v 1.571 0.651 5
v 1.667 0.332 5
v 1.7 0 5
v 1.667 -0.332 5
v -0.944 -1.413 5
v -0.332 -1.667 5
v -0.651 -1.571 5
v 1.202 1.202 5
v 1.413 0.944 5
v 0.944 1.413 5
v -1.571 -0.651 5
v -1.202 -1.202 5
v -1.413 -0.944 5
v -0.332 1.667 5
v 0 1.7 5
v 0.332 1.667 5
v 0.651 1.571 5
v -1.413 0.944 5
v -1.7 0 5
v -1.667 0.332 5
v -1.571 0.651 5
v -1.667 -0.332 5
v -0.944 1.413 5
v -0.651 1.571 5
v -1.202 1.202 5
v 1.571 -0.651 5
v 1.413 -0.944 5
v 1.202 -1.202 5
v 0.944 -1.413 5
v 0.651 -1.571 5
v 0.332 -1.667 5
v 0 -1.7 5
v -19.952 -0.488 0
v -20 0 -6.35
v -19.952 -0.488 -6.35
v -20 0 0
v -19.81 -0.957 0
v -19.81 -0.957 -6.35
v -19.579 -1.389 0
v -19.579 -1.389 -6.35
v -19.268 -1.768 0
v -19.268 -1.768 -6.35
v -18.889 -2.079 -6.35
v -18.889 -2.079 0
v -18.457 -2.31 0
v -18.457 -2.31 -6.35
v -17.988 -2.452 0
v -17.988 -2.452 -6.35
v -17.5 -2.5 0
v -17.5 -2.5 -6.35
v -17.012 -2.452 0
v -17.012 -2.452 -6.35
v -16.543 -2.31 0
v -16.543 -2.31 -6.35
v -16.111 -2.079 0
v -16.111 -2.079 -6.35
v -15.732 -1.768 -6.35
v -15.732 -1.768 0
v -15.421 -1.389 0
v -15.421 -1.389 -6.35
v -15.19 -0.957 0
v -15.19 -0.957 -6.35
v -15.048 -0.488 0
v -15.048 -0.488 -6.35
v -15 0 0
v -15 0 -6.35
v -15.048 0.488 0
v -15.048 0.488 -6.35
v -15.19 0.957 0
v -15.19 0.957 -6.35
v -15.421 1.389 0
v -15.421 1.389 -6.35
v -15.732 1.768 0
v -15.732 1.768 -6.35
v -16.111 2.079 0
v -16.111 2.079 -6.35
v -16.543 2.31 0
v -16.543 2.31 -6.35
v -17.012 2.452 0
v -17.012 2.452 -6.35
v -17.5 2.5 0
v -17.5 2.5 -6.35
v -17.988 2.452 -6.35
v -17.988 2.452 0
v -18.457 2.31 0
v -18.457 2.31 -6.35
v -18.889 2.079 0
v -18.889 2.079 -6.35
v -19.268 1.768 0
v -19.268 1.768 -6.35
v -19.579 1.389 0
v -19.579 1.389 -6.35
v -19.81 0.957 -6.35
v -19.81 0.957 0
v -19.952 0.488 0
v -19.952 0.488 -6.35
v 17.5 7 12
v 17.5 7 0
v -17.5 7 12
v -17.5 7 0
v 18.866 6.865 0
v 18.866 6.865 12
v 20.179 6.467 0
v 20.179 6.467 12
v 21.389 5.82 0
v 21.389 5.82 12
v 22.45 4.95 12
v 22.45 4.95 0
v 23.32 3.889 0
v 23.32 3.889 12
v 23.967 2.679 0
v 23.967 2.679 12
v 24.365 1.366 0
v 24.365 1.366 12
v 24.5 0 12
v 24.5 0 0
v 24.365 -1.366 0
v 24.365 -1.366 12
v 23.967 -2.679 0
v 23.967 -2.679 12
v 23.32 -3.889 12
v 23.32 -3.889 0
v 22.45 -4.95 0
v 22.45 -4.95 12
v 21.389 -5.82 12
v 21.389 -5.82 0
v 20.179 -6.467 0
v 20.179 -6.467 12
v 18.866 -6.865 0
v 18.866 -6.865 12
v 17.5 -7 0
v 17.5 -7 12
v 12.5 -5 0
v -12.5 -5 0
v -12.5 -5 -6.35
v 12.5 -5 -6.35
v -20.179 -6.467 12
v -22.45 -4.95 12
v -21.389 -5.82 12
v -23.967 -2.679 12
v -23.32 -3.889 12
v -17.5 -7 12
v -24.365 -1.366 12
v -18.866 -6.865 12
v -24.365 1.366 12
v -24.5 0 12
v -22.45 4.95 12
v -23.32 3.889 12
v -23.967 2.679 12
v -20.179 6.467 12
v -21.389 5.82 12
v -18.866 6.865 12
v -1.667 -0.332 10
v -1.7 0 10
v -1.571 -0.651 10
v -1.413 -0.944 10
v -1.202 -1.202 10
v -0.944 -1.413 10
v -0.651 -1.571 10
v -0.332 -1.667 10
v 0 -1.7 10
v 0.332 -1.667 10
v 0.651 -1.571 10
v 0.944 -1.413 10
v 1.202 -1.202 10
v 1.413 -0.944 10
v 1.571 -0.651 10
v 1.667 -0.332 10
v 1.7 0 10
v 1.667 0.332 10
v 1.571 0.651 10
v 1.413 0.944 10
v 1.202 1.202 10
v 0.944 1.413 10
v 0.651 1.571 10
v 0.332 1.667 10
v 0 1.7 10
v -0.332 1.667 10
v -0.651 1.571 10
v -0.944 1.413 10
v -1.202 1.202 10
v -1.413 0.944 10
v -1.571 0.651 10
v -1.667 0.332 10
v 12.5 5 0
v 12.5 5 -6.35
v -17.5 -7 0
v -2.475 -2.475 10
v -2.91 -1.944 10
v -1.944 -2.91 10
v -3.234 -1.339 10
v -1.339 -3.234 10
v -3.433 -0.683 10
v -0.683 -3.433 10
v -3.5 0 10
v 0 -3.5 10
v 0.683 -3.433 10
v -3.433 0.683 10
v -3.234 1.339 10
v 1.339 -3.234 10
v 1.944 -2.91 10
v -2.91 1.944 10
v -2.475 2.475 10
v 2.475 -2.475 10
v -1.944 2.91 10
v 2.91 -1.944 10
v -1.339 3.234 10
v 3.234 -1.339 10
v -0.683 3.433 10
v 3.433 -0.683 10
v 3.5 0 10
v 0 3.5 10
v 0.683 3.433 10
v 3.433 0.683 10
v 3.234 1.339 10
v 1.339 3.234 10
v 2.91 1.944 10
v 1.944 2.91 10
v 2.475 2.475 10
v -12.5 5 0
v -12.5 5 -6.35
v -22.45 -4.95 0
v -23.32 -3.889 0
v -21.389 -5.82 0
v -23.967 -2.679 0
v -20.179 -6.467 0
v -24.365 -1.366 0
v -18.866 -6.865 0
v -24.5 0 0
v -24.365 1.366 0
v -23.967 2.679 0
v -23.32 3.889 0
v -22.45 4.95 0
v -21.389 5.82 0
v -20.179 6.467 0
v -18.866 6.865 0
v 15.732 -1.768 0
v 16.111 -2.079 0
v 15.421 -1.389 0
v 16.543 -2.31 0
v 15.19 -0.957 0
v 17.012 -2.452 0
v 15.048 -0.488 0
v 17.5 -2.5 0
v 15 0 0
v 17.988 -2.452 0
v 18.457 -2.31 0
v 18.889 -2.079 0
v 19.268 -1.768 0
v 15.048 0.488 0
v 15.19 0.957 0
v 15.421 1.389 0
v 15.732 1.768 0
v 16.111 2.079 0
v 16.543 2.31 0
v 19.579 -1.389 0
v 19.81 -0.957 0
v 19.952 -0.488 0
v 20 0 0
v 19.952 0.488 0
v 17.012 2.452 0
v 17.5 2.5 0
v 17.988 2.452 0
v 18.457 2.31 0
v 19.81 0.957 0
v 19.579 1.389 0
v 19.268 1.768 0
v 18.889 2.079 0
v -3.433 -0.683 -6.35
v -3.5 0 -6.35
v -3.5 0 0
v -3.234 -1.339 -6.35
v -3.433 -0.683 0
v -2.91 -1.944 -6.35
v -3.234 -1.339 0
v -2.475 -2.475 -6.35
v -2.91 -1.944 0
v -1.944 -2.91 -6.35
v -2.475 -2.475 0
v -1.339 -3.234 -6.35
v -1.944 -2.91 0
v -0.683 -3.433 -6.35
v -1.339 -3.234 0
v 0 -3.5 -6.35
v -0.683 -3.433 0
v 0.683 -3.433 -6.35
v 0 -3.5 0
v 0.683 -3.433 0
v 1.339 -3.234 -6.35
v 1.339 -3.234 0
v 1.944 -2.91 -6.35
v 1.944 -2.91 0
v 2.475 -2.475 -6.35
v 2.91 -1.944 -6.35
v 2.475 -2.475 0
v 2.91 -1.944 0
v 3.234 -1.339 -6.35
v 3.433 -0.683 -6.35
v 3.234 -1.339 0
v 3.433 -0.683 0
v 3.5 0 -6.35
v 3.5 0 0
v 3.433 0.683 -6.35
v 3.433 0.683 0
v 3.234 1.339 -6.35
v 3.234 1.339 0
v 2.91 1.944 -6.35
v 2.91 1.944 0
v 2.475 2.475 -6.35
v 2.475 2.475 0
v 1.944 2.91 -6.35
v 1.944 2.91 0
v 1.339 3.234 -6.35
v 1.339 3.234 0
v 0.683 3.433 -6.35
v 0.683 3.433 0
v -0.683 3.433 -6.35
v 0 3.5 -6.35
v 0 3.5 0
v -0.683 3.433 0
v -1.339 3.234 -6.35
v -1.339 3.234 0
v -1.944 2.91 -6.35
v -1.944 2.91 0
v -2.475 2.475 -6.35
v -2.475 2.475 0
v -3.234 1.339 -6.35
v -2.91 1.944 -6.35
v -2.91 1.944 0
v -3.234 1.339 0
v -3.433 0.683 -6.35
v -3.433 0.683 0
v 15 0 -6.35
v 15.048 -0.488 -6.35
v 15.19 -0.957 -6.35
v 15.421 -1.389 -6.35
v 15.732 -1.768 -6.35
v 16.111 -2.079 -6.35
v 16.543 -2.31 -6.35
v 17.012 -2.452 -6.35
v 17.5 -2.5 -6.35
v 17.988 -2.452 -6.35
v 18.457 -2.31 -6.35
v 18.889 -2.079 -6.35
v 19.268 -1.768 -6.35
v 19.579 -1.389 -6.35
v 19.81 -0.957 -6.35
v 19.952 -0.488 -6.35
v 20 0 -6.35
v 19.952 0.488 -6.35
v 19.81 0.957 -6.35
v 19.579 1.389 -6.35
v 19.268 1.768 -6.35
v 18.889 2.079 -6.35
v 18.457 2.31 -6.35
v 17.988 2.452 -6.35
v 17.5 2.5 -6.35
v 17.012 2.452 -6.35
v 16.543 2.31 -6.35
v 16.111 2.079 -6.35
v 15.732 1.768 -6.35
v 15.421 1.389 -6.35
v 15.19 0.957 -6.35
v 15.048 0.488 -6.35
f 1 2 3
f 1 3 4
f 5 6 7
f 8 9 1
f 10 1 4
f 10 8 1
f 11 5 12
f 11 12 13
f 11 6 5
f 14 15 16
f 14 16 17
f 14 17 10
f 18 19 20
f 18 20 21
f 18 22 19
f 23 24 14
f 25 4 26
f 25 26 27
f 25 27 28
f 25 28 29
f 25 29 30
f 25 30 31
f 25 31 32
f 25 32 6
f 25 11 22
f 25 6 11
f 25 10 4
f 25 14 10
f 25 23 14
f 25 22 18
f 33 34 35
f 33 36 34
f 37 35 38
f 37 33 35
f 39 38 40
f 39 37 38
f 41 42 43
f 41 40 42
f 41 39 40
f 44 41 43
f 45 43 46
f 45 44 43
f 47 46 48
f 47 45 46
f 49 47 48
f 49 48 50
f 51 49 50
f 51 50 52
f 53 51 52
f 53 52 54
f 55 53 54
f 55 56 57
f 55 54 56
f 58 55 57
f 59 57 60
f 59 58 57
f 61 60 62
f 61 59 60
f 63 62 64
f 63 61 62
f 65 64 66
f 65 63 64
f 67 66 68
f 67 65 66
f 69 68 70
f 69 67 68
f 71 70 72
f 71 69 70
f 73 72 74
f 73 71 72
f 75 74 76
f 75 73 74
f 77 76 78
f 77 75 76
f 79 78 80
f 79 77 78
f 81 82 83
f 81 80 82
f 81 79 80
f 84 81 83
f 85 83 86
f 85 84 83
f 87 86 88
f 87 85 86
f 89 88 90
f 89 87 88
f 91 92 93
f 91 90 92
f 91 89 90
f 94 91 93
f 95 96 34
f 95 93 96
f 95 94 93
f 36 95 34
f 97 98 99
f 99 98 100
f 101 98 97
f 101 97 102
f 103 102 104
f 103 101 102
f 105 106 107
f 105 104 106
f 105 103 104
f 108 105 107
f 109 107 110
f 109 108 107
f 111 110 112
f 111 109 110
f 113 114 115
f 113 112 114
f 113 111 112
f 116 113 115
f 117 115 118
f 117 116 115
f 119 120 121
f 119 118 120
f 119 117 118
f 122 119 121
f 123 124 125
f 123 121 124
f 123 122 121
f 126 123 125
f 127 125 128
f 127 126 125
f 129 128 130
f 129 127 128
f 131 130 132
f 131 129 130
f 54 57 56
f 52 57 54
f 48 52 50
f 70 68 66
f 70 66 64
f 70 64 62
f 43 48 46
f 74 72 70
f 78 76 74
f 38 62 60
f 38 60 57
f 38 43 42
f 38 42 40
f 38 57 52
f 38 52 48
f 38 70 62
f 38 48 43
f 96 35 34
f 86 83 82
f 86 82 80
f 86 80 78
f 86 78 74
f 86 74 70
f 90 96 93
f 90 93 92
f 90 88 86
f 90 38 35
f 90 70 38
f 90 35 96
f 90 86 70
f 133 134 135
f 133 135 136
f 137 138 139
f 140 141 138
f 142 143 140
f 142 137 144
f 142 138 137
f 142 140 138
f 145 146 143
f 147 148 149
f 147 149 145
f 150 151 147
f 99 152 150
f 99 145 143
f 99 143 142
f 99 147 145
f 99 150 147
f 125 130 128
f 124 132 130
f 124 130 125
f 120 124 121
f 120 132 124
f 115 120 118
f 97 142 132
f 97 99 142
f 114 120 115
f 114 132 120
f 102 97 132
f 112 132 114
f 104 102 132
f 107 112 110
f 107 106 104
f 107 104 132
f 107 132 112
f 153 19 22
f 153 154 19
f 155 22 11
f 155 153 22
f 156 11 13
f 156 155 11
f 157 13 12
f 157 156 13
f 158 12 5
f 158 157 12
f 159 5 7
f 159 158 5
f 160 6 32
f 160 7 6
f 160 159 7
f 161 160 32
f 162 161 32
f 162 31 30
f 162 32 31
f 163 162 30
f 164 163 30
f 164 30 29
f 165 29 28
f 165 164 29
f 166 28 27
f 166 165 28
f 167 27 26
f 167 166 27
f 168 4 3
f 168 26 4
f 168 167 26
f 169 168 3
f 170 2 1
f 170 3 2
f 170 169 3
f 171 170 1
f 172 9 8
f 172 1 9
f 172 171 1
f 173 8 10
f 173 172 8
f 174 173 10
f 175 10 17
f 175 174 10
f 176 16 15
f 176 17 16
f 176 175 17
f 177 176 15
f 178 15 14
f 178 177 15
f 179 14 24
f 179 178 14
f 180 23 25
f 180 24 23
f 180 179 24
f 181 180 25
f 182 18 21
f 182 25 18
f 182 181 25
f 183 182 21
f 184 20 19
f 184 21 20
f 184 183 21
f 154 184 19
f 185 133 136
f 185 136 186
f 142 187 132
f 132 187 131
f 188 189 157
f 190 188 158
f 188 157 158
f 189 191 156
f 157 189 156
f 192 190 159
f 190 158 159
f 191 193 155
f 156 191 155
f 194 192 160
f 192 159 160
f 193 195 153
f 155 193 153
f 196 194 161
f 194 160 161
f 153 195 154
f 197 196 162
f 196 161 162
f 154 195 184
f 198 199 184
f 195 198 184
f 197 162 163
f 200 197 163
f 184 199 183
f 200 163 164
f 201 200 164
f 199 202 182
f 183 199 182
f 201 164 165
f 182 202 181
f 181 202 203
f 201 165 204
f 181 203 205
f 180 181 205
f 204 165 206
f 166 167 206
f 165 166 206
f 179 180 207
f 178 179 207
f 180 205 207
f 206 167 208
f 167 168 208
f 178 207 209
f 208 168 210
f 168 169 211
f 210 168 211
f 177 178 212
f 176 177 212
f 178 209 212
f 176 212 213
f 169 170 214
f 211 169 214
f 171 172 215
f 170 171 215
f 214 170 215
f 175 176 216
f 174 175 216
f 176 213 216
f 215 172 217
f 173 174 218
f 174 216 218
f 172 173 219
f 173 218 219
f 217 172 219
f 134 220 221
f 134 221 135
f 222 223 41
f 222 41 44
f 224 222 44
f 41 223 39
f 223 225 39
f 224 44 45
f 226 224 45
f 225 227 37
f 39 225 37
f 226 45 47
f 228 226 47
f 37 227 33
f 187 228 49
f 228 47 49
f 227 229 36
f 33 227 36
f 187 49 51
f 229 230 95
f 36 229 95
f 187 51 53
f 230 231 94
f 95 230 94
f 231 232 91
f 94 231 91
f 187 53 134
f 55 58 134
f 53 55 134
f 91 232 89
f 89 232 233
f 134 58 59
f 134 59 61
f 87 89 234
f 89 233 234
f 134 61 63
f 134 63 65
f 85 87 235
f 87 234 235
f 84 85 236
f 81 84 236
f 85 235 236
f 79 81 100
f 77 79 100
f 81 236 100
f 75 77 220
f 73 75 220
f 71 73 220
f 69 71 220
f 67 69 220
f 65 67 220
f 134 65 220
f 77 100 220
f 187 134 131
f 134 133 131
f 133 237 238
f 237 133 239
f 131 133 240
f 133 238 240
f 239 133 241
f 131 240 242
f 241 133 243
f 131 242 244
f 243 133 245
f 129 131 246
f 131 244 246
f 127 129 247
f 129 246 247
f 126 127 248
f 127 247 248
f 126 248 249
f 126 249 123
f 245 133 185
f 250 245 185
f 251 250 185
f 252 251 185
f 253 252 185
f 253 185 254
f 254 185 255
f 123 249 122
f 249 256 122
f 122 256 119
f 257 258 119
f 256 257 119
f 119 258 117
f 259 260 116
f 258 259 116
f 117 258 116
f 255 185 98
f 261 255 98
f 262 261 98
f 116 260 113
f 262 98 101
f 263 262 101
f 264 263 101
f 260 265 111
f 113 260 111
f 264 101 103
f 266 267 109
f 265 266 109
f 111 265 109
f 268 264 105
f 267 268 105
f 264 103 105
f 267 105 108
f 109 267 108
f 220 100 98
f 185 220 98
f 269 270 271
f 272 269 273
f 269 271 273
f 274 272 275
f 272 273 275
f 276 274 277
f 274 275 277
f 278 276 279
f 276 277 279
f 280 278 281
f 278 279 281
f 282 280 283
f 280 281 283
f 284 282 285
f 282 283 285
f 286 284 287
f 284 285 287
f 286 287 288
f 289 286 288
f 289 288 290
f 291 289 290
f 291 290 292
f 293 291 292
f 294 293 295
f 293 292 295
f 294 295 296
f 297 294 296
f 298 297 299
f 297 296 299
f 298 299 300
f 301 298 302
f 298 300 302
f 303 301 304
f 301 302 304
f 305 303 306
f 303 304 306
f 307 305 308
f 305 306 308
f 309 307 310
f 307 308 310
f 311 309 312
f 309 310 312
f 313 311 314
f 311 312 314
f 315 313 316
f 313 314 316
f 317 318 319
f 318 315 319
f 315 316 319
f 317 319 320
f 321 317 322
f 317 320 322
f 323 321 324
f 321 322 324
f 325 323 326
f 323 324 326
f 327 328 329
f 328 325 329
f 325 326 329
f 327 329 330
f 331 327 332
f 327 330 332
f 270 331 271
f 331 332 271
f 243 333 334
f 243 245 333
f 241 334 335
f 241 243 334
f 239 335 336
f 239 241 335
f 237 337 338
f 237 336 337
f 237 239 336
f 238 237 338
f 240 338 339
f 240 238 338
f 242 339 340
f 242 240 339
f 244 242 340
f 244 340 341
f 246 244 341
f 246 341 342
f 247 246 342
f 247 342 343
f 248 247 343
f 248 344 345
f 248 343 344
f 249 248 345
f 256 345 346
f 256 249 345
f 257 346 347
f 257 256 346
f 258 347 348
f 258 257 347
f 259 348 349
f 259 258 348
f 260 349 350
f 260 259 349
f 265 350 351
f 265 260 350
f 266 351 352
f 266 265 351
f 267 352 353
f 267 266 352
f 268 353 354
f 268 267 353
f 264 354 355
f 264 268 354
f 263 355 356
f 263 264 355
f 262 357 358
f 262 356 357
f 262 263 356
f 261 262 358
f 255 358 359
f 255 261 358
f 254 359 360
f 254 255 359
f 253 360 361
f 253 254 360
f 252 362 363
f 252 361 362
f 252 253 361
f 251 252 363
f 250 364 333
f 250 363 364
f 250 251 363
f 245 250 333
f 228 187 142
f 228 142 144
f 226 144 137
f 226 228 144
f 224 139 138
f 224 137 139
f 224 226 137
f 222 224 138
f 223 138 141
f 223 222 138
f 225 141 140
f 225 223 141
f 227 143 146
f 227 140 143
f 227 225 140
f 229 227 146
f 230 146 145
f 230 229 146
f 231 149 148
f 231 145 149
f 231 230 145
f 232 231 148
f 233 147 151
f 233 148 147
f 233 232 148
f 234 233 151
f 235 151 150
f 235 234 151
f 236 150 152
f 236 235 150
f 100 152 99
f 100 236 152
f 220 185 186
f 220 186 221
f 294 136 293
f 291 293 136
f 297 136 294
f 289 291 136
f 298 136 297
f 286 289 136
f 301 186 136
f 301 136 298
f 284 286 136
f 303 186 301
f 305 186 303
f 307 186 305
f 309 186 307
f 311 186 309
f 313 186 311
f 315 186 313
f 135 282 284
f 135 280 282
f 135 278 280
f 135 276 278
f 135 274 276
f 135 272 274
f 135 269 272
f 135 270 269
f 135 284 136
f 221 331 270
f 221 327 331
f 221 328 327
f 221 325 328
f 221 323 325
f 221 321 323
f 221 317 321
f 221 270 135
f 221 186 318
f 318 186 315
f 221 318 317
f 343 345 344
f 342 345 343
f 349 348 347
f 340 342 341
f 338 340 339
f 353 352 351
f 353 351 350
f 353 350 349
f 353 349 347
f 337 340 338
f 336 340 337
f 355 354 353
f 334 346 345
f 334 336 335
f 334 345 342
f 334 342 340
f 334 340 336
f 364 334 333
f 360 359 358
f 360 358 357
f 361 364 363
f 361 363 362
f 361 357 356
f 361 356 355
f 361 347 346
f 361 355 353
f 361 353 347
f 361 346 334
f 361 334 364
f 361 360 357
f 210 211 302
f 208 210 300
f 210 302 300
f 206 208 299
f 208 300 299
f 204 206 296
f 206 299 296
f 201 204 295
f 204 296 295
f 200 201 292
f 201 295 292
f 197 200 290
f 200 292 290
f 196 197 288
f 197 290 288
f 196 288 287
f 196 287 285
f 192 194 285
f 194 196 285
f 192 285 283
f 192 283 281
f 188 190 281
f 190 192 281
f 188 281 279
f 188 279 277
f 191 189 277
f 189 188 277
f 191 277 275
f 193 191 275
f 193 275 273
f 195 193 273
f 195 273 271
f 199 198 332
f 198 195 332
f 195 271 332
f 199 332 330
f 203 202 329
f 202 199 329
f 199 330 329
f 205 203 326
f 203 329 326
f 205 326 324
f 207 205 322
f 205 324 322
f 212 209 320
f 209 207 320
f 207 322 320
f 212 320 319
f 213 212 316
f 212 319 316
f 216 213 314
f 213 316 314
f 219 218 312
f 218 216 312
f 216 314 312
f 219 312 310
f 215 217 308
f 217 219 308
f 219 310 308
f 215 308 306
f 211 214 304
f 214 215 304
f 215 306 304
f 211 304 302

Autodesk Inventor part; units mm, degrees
ref_plane "YZ Plane" through (0, 0, 0) normal (1, 0, 0) x (0, 1, 0)
ref_plane "XZ Plane" through (0, 0, 0) normal (0, 1, 0) x (-1, 0, 0)
ref_plane "XY Plane" through (0, 0, 0) normal (0, 0, 1) x (1, 0, 0)
sketch "Sketch1" plane through (0, 0, 0) normal (0, 0, 1) x (1, 0, 0)
  circle A0 centre (17.5, 0) radius 2.5 projected
  circle A1 centre (-17.5, 0) radius 2.5 projected
  line L0 (17.5, -7) -> (-17.5, -7)
  arc A2 (-17.5, 7) -> (-17.5, -7) centre (-17.5, 0) ccw
  line L1 (-17.5, 7) -> (17.5, 7)
  arc A3 (17.5, -7) -> (17.5, 7) centre (17.5, 0) ccw
  line L2 (-12.5, -5) -> (12.5, -5) projected
  line L3 (12.5, 5) -> (-12.5, 5) projected
  circle A4 centre (0, 0) radius 3.5
  dimension "d0" = 2
  dimension "d1" = 17.5
  dimension "d2" = 7
extrude "Extrusion1" add sketch "Sketch1" along normal blind 10 contours A0 | A1 | L0 A2 L1 A3
sketch "Sketch2" plane through (0, 0, 10) normal (0, 0, 1) x (1, 0, 0)
  arc A0 (17.5, -7) -> (17.5, 7) centre (17.5, 0) ccw projected
  line L0 (-17.5, -7) -> (17.5, -7) projected
  arc A1 (-17.5, 7) -> (-17.5, -7) centre (-17.5, 0) ccw projected
  line L1 (17.5, 7) -> (-17.5, 7) projected
  point P0 (0, 0)
extrude "Extrusion2" add sketch "Sketch2" along normal blind 2
sketch "Sketch3" plane through (0, 0, 10) normal (0, 0, -1) x (-1, 0, 0)
  circle A0 centre (0, 0) radius 1.7
  dimension "d7" = 3.4
extrude "Extrusion3" add sketch "Sketch3" along normal blind 5
sketch "Sketch4" plane through (0, 0, 0) normal (0, 0, -1) x (-1, 0, 0)
  circle A0 centre (17.5, 0) radius 2.5 projected
  line L0 (12.5, 5) -> (12.5, -5) projected
  line L1 (-12.5, 5) -> (12.5, 5) projected
  line L2 (12.5, -5) -> (-12.5, -5) projected
  line L3 (-12.5, -5) -> (-12.5, 5) projected
  circle A1 centre (0, 0) radius 3.5 projected
  circle A2 centre (-17.5, 0) radius 2.5 projected
extrude "Extrusion4" add sketch "Sketch4" along normal blind 6.35
properties part number "SpringHolderV1"
